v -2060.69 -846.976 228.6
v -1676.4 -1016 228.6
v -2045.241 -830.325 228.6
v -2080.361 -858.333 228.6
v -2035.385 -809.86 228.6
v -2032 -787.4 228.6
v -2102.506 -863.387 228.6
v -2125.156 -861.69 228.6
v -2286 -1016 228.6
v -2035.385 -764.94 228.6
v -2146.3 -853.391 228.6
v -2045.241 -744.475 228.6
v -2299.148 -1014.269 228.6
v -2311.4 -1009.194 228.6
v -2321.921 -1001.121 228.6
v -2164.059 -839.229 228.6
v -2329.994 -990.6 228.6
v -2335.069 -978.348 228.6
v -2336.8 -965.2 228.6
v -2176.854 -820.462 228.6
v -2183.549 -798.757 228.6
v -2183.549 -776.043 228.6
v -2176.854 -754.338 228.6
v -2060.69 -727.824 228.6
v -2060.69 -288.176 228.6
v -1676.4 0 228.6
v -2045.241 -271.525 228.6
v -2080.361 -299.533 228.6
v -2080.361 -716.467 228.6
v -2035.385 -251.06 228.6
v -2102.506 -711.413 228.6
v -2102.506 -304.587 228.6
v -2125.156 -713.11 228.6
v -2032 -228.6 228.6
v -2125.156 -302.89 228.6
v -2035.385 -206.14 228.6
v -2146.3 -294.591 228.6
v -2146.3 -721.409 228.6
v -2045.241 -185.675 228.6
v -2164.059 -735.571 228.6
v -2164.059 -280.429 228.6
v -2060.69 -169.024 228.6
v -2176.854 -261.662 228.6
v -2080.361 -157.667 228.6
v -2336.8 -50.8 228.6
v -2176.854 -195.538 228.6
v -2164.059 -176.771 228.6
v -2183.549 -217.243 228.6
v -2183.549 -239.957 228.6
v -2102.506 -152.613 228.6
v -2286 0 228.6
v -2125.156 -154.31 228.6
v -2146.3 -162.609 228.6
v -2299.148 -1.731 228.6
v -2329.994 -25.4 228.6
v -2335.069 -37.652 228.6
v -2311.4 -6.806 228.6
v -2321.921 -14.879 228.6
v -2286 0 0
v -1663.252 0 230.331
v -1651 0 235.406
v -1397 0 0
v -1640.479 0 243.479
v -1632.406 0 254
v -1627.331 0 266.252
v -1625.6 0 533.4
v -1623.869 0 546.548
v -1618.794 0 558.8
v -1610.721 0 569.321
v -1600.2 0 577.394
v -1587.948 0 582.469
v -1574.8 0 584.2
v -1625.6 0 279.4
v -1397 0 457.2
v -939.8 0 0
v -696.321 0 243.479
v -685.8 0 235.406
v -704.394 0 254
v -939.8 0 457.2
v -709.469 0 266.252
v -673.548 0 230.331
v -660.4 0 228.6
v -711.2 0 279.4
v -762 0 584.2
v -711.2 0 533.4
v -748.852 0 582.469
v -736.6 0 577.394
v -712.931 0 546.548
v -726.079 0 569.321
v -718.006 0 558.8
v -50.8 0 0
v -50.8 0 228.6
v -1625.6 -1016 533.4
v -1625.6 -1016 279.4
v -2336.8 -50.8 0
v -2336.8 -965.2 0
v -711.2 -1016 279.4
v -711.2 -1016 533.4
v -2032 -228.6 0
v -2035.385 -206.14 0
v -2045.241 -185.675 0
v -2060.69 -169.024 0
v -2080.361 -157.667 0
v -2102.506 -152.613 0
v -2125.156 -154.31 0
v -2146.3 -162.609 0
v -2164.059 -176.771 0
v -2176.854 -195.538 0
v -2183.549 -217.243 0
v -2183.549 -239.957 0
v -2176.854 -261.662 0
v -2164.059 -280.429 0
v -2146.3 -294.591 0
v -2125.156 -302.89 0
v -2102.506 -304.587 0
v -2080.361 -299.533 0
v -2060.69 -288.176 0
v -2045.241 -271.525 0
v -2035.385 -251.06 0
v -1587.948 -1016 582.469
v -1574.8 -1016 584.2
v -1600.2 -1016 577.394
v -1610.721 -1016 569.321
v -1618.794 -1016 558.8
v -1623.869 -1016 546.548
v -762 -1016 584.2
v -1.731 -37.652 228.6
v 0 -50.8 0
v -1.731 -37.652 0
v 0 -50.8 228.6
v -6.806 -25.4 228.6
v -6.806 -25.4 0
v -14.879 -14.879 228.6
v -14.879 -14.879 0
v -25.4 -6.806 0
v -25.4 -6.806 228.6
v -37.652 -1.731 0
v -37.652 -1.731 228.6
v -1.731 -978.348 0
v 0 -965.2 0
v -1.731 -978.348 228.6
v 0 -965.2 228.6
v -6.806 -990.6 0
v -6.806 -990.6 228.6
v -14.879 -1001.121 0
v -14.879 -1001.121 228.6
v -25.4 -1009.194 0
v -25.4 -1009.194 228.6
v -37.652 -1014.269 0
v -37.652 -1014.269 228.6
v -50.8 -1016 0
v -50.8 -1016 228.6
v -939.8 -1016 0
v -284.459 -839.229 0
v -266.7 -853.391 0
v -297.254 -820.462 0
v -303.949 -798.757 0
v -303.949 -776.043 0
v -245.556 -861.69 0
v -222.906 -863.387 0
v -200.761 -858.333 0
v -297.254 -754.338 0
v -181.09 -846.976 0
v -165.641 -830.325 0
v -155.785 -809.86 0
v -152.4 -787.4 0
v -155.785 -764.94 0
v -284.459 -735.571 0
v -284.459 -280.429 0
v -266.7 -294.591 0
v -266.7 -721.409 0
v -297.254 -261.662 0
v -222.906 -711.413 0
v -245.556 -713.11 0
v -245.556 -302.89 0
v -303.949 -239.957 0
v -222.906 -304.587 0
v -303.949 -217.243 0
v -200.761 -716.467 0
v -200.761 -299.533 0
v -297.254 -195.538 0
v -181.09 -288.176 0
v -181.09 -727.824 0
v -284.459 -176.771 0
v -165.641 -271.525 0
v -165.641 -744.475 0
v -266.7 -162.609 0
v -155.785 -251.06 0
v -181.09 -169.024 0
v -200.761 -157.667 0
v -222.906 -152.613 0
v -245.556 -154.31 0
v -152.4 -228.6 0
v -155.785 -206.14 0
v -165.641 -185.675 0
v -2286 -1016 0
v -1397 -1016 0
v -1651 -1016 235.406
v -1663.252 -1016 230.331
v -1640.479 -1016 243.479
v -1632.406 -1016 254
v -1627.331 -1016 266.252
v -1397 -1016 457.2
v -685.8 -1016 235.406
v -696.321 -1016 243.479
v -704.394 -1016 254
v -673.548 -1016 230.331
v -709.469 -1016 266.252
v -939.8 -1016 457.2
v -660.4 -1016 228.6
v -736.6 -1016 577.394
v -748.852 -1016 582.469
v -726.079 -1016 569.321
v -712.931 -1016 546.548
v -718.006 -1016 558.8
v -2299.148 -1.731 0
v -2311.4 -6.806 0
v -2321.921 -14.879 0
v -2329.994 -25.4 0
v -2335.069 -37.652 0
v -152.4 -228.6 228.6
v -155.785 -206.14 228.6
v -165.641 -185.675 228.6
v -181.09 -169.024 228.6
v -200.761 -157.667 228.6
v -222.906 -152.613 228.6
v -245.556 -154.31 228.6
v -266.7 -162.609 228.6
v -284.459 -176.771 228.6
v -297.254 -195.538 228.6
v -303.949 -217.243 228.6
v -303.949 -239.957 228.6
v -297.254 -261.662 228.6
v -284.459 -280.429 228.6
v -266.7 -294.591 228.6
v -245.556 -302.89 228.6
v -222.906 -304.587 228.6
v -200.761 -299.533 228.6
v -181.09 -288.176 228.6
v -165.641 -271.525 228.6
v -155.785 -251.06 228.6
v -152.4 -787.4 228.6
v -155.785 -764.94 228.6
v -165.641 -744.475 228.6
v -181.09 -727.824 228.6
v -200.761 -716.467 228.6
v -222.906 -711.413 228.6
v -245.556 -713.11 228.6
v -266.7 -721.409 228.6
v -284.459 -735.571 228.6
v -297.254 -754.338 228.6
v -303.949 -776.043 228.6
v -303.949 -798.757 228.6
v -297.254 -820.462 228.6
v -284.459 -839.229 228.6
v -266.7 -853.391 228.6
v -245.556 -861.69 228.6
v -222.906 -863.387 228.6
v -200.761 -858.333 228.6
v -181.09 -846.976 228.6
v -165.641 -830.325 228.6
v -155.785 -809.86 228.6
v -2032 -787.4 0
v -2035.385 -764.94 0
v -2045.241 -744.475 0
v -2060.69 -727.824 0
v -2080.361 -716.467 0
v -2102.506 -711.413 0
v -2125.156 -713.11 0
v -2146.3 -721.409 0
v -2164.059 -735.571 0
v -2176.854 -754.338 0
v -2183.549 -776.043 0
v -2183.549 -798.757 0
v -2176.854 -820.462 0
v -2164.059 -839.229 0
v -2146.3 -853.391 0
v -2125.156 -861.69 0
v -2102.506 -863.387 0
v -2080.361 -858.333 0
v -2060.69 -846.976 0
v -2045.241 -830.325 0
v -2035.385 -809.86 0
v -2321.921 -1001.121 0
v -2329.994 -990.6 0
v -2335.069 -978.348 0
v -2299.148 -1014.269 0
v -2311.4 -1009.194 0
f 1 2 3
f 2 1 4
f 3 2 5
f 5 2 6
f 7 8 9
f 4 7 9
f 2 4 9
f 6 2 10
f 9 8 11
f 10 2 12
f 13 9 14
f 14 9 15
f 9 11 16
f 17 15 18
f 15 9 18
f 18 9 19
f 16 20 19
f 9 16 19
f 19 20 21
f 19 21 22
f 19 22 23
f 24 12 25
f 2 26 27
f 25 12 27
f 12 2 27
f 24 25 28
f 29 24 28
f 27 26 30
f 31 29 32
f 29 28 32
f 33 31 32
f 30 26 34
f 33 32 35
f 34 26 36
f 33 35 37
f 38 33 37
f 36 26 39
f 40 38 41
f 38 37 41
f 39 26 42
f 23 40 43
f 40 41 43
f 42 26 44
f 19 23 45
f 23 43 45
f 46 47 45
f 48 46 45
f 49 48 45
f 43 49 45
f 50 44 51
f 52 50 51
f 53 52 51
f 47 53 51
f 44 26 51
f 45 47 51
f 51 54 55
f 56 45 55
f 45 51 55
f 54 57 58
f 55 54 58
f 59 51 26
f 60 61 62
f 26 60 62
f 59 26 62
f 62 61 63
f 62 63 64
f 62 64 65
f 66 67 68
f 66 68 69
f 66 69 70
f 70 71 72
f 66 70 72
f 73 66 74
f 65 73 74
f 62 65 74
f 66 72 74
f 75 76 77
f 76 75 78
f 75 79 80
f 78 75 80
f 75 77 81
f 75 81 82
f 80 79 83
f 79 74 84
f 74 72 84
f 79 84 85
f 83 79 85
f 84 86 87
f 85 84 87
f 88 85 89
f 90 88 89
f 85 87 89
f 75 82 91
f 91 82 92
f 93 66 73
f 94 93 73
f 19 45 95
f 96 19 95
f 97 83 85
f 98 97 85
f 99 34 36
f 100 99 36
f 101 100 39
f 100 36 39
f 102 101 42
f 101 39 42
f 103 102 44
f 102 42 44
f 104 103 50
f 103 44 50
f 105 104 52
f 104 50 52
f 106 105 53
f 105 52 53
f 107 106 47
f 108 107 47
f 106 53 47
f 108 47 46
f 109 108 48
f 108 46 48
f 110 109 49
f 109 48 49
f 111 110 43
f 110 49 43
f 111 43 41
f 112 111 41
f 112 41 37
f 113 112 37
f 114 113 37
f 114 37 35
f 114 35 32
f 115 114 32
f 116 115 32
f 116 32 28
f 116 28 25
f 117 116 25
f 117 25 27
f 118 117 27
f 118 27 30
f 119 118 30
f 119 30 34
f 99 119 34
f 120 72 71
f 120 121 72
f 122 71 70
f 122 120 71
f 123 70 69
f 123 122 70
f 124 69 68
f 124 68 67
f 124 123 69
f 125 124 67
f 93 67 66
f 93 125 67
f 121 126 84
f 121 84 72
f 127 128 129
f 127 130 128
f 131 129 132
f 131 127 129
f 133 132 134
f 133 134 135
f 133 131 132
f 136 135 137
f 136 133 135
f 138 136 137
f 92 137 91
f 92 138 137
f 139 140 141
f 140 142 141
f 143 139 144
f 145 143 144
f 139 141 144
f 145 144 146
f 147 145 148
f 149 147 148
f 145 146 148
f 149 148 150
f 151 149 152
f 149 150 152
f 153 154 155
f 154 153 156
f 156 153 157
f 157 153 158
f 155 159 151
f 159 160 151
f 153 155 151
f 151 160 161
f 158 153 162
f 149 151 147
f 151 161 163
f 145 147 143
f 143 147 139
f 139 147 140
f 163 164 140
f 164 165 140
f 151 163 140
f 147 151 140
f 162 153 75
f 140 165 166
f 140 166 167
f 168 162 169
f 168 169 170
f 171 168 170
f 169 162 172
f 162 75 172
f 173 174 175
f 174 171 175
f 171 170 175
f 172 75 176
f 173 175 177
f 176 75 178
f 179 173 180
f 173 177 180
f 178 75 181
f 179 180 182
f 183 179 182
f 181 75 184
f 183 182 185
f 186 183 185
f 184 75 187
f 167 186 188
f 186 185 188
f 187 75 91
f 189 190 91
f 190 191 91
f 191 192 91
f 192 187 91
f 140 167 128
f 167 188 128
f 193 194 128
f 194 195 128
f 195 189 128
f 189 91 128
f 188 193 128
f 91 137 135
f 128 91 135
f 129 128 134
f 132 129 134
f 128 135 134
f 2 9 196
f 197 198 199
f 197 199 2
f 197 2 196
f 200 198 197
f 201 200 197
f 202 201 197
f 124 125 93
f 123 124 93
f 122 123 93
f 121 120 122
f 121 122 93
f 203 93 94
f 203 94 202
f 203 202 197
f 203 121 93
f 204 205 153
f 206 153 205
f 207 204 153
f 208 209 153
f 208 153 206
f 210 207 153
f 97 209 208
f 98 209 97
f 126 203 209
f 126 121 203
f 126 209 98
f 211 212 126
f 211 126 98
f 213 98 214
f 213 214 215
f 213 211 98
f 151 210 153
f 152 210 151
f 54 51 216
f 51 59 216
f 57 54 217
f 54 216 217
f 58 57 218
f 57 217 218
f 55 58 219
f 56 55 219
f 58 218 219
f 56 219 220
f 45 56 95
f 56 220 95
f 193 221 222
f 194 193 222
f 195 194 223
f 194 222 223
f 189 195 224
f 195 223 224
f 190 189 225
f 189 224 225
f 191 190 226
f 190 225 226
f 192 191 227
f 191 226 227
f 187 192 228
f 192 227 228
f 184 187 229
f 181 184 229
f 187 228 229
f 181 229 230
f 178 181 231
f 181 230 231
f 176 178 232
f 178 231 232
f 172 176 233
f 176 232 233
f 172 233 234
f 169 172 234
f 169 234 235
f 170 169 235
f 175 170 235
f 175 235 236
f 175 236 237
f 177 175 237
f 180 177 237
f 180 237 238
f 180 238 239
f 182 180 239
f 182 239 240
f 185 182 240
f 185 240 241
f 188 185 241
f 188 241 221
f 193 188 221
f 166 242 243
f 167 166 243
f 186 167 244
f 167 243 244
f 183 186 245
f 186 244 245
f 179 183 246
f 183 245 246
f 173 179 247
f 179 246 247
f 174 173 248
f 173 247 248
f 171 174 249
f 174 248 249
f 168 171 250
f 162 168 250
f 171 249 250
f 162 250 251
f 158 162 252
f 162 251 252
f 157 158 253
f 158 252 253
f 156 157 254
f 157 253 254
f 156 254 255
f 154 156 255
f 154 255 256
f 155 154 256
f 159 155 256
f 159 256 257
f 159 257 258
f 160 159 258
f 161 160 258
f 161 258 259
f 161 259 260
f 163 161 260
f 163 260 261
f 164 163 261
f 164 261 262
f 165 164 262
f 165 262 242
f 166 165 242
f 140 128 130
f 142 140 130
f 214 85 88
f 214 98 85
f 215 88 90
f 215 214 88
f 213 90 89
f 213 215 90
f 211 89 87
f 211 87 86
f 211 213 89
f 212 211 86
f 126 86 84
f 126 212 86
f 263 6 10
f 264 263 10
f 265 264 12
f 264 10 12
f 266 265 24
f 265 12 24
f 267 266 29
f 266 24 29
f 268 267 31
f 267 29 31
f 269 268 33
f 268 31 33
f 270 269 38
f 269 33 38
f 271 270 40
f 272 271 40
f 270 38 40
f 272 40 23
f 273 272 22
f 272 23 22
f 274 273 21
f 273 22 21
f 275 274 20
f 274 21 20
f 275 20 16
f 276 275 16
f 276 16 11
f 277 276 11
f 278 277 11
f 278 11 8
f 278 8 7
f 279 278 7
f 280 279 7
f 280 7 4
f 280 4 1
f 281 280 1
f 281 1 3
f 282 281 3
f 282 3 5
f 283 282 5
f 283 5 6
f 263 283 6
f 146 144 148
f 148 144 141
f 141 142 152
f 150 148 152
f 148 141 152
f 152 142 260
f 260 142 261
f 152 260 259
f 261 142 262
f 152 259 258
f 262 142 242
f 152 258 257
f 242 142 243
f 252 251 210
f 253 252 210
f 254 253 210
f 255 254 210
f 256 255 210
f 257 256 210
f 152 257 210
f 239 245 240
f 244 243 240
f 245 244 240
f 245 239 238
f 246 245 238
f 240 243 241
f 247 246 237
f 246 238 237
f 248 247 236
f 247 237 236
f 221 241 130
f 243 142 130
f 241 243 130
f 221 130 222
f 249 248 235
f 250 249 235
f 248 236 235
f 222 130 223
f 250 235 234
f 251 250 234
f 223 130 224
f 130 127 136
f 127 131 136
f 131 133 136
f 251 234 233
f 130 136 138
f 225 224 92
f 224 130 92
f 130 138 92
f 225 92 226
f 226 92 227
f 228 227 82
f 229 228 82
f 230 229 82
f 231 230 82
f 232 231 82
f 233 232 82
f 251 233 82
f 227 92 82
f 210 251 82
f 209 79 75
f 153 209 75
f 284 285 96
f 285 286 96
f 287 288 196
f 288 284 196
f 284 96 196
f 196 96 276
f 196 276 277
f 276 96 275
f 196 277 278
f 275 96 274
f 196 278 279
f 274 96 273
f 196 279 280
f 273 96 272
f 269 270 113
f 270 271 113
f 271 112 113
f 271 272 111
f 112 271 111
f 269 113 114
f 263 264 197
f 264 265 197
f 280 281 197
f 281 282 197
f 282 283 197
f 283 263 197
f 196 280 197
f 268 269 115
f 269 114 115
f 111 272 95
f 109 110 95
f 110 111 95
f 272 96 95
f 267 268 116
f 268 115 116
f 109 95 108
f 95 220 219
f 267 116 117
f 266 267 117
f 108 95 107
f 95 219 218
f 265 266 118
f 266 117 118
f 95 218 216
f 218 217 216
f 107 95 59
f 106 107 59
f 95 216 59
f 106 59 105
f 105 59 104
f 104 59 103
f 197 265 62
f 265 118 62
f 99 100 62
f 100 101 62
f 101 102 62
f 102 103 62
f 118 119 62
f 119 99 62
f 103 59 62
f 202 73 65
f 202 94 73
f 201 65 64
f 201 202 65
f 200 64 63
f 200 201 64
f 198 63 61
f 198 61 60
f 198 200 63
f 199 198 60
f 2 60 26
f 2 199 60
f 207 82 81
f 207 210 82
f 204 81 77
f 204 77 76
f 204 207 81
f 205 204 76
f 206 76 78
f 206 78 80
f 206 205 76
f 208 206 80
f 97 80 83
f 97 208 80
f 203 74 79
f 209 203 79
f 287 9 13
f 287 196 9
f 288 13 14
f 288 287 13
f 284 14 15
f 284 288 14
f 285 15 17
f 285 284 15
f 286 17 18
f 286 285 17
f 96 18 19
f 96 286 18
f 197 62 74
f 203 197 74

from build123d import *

# Parameters (mm, degrees)
F1_DEPTH = 1016
F2_R     = 50.8
F3_R     = 50.8
F4_R     = 76.2
F5_DEPTH = 2286


with BuildPart() as f1:
    # F0 (on Front) → F1 (new body)
    with BuildSketch(Plane.XZ):
        Polygon((-939.8, 0), (0, 0), (0, 228.6), (-711.2, 228.6), (-711.2, 584.2), (-1625.6, 584.2), (-1625.6, 228.6), (-2336.8, 228.6), (-2336.8, 0), (-1397, 0), (-1397, 228.6), (-1397, 457.2), (-939.8, 457.2), (-939.8, 228.6), align=None)
    extrude(amount=F1_DEPTH)

    # F2
    f2_edges = [f1.edges().sort_by_distance(p)[0] for p in [
        (0, -1016, 114.3),
    ]]
    fillet(f2_edges, radius=F2_R)

    # F3
    f3_edges = [f1.edges().sort_by_distance(p)[0] for p in [
        (0, 0, 114.3),
        (-711.2, -508, 228.6),
        (-711.2, -508, 584.2),
        (-1625.6, -508, 584.2),
        (-1625.6, -508, 228.6),
        (-2336.8, 0, 114.3),
        (-2336.8, -1016, 114.3),
    ]]
    fillet(f3_edges, radius=F3_R)

    # F4 (on face) → F5 (cut)
    with BuildSketch(Plane.XY.offset(228.6)):
        with Locations((-228.6, -228.6)):
            Circle(F4_R)
        with Locations((-228.6, -787.4)):
            Circle(F4_R)
        with Locations((-2108.2, -787.4)):
            Circle(F4_R)
        with Locations((-2108.2, -228.6)):
            Circle(F4_R)
    extrude(amount=-F5_DEPTH, mode=Mode.SUBTRACT)


solid = f1.part
